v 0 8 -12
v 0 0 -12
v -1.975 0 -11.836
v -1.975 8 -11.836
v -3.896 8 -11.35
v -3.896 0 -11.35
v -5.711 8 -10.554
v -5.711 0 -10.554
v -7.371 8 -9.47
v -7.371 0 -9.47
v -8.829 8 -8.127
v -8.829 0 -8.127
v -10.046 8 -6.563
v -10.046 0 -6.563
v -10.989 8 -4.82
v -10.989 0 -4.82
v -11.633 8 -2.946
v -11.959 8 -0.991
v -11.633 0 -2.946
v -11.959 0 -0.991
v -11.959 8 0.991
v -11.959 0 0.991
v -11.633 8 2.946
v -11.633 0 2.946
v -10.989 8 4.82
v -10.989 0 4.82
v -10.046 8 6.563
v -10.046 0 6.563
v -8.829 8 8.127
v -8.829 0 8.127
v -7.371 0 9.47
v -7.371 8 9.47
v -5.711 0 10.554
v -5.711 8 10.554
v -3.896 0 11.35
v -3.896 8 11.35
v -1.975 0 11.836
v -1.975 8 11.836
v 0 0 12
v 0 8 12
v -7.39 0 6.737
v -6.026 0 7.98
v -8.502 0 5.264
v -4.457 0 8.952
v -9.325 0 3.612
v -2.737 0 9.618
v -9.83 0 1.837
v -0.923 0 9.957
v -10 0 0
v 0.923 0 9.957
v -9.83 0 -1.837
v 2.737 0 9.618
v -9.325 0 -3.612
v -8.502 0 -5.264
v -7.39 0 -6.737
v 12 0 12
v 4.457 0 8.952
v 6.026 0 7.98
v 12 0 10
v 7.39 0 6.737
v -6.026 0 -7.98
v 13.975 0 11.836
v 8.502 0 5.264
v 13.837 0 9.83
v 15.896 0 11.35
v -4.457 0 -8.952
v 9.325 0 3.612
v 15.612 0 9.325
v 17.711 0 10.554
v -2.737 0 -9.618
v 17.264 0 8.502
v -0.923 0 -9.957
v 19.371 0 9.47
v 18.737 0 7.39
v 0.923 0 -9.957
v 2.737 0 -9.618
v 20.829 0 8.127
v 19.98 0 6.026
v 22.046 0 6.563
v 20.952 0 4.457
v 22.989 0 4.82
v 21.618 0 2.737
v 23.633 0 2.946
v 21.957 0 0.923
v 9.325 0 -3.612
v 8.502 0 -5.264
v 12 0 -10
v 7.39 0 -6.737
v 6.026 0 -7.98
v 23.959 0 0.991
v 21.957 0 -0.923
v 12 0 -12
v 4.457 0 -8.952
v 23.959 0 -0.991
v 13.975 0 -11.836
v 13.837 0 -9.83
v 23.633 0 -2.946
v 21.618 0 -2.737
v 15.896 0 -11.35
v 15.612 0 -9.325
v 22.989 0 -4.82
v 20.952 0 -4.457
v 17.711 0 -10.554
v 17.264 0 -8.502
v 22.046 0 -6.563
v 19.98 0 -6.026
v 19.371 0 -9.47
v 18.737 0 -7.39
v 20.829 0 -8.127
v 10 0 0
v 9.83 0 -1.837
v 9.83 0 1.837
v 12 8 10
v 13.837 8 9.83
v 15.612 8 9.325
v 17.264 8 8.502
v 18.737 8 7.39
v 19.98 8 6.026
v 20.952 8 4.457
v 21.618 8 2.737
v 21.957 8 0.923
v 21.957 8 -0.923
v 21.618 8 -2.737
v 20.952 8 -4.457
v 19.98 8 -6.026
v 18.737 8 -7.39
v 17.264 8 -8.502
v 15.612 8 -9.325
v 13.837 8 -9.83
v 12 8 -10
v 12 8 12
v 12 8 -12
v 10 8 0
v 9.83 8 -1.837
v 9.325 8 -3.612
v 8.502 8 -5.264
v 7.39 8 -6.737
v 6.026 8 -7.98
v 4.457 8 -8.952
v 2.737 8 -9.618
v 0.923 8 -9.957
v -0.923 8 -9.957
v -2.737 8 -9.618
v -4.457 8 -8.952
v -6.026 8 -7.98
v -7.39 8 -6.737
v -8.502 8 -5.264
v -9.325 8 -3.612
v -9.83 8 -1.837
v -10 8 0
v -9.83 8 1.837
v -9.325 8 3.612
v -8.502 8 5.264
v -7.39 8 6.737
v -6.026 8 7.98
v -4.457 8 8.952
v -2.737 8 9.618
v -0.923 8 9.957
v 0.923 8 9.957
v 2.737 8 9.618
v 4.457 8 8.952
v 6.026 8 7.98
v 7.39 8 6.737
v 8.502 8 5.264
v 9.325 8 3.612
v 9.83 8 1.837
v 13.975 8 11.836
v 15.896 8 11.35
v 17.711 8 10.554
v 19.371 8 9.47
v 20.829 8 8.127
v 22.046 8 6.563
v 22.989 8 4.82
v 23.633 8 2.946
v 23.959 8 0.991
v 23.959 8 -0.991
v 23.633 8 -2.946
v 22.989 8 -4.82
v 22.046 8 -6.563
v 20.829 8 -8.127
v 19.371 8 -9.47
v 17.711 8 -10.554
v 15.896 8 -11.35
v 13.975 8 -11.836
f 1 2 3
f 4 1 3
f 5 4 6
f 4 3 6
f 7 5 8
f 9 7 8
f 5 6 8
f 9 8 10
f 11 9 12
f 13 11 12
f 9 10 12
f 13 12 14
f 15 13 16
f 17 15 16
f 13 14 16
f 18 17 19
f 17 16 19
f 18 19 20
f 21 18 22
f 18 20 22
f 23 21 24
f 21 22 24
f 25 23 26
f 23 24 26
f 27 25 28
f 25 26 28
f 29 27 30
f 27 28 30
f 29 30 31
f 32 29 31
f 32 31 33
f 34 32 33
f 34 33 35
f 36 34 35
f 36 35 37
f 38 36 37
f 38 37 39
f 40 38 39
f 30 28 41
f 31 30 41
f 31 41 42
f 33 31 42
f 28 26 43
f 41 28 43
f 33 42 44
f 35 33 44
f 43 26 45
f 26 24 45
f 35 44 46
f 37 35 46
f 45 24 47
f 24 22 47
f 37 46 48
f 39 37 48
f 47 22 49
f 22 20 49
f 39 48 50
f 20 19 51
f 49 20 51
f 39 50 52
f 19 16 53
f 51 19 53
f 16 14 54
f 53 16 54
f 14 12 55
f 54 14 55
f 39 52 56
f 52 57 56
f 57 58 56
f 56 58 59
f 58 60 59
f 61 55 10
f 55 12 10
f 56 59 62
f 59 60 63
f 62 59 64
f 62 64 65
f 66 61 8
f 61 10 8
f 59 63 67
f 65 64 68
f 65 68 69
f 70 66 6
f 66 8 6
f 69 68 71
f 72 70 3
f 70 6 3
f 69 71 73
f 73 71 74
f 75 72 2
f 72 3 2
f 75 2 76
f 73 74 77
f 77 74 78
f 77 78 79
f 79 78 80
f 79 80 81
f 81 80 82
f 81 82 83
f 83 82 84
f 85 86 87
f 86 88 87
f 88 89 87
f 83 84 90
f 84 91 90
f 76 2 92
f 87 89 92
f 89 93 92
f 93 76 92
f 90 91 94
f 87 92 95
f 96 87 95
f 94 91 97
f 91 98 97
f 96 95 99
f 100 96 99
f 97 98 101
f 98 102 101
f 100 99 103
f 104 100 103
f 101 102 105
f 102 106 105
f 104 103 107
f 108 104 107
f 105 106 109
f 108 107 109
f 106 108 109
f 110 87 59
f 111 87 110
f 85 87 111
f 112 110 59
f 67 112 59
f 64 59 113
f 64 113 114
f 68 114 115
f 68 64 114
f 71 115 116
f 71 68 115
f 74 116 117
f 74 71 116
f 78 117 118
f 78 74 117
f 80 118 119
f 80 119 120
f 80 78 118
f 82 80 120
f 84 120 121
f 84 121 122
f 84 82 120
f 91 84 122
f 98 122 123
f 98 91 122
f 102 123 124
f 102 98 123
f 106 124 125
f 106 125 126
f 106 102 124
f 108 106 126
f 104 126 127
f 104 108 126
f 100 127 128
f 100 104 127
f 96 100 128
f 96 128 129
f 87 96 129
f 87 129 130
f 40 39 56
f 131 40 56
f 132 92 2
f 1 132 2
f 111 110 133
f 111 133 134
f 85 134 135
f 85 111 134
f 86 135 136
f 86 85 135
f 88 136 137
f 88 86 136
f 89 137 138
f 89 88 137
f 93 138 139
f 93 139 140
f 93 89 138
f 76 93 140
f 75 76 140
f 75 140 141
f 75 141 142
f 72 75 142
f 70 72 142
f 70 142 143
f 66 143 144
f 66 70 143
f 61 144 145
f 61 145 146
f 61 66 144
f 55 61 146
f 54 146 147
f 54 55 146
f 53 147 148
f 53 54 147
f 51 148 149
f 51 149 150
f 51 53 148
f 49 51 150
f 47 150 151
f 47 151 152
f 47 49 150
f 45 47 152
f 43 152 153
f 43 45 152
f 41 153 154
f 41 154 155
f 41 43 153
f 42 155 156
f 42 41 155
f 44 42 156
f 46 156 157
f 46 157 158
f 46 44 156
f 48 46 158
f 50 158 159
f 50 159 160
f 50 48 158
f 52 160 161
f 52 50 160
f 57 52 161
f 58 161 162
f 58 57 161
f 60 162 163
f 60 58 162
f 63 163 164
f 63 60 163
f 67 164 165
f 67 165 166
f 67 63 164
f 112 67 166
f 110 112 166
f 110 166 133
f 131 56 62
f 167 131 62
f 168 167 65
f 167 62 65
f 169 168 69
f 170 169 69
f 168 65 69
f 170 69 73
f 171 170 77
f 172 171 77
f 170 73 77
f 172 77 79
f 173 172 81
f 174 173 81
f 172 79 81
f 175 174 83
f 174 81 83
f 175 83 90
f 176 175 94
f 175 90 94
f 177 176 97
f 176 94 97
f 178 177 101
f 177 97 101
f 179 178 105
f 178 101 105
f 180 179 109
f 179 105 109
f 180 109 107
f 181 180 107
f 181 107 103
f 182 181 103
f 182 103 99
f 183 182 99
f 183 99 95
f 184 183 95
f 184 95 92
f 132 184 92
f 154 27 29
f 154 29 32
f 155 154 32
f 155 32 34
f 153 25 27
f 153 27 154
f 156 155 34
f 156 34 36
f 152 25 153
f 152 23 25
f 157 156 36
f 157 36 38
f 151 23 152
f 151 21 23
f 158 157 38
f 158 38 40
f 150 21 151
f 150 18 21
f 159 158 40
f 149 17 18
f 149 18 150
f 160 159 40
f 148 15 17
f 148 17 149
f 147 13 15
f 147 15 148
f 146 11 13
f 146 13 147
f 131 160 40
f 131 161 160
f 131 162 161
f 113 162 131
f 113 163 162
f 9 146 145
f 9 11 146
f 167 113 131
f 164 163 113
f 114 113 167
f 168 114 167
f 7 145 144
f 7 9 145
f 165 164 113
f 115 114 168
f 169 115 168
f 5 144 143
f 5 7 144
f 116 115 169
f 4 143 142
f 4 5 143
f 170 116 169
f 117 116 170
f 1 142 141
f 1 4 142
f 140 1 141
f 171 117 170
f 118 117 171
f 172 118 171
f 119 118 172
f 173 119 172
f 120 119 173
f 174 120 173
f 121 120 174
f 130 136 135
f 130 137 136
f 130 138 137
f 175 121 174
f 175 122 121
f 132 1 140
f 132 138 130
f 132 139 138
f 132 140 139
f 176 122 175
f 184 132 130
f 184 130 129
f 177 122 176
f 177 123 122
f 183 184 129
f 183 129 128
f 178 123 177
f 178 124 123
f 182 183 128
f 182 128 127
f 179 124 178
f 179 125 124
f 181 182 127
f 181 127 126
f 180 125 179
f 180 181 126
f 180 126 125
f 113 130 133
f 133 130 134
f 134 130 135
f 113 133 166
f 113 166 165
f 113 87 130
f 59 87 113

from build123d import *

# Parameters (mm, degrees)
SKETCH_1_R      = 10
EXTRUDE_1_DEPTH = 8


with BuildPart() as part:
    # 草图1 → 凸台-拉伸1 (new body)
    with BuildSketch(Plane(origin=(0, 0, 0), x_dir=(1, 0, 0), z_dir=(0, 1, 0))):
        with BuildLine():
            Line((0, -12), (12, -12))
            ThreePointArc((12, -12), (24, 0), (12, 12))
            Line((12, 12), (0, 12))
            ThreePointArc((0, 12), (-12, 0), (0, -12))
        make_face()
        Circle(SKETCH_1_R, mode=Mode.SUBTRACT)
        with BuildLine():
            Line((12, 10), (12, -10))
            ThreePointArc((12, -10), (22, 0), (12, 10))
        make_face(mode=Mode.SUBTRACT)
    extrude(amount=EXTRUDE_1_DEPTH)


solid = part.part
